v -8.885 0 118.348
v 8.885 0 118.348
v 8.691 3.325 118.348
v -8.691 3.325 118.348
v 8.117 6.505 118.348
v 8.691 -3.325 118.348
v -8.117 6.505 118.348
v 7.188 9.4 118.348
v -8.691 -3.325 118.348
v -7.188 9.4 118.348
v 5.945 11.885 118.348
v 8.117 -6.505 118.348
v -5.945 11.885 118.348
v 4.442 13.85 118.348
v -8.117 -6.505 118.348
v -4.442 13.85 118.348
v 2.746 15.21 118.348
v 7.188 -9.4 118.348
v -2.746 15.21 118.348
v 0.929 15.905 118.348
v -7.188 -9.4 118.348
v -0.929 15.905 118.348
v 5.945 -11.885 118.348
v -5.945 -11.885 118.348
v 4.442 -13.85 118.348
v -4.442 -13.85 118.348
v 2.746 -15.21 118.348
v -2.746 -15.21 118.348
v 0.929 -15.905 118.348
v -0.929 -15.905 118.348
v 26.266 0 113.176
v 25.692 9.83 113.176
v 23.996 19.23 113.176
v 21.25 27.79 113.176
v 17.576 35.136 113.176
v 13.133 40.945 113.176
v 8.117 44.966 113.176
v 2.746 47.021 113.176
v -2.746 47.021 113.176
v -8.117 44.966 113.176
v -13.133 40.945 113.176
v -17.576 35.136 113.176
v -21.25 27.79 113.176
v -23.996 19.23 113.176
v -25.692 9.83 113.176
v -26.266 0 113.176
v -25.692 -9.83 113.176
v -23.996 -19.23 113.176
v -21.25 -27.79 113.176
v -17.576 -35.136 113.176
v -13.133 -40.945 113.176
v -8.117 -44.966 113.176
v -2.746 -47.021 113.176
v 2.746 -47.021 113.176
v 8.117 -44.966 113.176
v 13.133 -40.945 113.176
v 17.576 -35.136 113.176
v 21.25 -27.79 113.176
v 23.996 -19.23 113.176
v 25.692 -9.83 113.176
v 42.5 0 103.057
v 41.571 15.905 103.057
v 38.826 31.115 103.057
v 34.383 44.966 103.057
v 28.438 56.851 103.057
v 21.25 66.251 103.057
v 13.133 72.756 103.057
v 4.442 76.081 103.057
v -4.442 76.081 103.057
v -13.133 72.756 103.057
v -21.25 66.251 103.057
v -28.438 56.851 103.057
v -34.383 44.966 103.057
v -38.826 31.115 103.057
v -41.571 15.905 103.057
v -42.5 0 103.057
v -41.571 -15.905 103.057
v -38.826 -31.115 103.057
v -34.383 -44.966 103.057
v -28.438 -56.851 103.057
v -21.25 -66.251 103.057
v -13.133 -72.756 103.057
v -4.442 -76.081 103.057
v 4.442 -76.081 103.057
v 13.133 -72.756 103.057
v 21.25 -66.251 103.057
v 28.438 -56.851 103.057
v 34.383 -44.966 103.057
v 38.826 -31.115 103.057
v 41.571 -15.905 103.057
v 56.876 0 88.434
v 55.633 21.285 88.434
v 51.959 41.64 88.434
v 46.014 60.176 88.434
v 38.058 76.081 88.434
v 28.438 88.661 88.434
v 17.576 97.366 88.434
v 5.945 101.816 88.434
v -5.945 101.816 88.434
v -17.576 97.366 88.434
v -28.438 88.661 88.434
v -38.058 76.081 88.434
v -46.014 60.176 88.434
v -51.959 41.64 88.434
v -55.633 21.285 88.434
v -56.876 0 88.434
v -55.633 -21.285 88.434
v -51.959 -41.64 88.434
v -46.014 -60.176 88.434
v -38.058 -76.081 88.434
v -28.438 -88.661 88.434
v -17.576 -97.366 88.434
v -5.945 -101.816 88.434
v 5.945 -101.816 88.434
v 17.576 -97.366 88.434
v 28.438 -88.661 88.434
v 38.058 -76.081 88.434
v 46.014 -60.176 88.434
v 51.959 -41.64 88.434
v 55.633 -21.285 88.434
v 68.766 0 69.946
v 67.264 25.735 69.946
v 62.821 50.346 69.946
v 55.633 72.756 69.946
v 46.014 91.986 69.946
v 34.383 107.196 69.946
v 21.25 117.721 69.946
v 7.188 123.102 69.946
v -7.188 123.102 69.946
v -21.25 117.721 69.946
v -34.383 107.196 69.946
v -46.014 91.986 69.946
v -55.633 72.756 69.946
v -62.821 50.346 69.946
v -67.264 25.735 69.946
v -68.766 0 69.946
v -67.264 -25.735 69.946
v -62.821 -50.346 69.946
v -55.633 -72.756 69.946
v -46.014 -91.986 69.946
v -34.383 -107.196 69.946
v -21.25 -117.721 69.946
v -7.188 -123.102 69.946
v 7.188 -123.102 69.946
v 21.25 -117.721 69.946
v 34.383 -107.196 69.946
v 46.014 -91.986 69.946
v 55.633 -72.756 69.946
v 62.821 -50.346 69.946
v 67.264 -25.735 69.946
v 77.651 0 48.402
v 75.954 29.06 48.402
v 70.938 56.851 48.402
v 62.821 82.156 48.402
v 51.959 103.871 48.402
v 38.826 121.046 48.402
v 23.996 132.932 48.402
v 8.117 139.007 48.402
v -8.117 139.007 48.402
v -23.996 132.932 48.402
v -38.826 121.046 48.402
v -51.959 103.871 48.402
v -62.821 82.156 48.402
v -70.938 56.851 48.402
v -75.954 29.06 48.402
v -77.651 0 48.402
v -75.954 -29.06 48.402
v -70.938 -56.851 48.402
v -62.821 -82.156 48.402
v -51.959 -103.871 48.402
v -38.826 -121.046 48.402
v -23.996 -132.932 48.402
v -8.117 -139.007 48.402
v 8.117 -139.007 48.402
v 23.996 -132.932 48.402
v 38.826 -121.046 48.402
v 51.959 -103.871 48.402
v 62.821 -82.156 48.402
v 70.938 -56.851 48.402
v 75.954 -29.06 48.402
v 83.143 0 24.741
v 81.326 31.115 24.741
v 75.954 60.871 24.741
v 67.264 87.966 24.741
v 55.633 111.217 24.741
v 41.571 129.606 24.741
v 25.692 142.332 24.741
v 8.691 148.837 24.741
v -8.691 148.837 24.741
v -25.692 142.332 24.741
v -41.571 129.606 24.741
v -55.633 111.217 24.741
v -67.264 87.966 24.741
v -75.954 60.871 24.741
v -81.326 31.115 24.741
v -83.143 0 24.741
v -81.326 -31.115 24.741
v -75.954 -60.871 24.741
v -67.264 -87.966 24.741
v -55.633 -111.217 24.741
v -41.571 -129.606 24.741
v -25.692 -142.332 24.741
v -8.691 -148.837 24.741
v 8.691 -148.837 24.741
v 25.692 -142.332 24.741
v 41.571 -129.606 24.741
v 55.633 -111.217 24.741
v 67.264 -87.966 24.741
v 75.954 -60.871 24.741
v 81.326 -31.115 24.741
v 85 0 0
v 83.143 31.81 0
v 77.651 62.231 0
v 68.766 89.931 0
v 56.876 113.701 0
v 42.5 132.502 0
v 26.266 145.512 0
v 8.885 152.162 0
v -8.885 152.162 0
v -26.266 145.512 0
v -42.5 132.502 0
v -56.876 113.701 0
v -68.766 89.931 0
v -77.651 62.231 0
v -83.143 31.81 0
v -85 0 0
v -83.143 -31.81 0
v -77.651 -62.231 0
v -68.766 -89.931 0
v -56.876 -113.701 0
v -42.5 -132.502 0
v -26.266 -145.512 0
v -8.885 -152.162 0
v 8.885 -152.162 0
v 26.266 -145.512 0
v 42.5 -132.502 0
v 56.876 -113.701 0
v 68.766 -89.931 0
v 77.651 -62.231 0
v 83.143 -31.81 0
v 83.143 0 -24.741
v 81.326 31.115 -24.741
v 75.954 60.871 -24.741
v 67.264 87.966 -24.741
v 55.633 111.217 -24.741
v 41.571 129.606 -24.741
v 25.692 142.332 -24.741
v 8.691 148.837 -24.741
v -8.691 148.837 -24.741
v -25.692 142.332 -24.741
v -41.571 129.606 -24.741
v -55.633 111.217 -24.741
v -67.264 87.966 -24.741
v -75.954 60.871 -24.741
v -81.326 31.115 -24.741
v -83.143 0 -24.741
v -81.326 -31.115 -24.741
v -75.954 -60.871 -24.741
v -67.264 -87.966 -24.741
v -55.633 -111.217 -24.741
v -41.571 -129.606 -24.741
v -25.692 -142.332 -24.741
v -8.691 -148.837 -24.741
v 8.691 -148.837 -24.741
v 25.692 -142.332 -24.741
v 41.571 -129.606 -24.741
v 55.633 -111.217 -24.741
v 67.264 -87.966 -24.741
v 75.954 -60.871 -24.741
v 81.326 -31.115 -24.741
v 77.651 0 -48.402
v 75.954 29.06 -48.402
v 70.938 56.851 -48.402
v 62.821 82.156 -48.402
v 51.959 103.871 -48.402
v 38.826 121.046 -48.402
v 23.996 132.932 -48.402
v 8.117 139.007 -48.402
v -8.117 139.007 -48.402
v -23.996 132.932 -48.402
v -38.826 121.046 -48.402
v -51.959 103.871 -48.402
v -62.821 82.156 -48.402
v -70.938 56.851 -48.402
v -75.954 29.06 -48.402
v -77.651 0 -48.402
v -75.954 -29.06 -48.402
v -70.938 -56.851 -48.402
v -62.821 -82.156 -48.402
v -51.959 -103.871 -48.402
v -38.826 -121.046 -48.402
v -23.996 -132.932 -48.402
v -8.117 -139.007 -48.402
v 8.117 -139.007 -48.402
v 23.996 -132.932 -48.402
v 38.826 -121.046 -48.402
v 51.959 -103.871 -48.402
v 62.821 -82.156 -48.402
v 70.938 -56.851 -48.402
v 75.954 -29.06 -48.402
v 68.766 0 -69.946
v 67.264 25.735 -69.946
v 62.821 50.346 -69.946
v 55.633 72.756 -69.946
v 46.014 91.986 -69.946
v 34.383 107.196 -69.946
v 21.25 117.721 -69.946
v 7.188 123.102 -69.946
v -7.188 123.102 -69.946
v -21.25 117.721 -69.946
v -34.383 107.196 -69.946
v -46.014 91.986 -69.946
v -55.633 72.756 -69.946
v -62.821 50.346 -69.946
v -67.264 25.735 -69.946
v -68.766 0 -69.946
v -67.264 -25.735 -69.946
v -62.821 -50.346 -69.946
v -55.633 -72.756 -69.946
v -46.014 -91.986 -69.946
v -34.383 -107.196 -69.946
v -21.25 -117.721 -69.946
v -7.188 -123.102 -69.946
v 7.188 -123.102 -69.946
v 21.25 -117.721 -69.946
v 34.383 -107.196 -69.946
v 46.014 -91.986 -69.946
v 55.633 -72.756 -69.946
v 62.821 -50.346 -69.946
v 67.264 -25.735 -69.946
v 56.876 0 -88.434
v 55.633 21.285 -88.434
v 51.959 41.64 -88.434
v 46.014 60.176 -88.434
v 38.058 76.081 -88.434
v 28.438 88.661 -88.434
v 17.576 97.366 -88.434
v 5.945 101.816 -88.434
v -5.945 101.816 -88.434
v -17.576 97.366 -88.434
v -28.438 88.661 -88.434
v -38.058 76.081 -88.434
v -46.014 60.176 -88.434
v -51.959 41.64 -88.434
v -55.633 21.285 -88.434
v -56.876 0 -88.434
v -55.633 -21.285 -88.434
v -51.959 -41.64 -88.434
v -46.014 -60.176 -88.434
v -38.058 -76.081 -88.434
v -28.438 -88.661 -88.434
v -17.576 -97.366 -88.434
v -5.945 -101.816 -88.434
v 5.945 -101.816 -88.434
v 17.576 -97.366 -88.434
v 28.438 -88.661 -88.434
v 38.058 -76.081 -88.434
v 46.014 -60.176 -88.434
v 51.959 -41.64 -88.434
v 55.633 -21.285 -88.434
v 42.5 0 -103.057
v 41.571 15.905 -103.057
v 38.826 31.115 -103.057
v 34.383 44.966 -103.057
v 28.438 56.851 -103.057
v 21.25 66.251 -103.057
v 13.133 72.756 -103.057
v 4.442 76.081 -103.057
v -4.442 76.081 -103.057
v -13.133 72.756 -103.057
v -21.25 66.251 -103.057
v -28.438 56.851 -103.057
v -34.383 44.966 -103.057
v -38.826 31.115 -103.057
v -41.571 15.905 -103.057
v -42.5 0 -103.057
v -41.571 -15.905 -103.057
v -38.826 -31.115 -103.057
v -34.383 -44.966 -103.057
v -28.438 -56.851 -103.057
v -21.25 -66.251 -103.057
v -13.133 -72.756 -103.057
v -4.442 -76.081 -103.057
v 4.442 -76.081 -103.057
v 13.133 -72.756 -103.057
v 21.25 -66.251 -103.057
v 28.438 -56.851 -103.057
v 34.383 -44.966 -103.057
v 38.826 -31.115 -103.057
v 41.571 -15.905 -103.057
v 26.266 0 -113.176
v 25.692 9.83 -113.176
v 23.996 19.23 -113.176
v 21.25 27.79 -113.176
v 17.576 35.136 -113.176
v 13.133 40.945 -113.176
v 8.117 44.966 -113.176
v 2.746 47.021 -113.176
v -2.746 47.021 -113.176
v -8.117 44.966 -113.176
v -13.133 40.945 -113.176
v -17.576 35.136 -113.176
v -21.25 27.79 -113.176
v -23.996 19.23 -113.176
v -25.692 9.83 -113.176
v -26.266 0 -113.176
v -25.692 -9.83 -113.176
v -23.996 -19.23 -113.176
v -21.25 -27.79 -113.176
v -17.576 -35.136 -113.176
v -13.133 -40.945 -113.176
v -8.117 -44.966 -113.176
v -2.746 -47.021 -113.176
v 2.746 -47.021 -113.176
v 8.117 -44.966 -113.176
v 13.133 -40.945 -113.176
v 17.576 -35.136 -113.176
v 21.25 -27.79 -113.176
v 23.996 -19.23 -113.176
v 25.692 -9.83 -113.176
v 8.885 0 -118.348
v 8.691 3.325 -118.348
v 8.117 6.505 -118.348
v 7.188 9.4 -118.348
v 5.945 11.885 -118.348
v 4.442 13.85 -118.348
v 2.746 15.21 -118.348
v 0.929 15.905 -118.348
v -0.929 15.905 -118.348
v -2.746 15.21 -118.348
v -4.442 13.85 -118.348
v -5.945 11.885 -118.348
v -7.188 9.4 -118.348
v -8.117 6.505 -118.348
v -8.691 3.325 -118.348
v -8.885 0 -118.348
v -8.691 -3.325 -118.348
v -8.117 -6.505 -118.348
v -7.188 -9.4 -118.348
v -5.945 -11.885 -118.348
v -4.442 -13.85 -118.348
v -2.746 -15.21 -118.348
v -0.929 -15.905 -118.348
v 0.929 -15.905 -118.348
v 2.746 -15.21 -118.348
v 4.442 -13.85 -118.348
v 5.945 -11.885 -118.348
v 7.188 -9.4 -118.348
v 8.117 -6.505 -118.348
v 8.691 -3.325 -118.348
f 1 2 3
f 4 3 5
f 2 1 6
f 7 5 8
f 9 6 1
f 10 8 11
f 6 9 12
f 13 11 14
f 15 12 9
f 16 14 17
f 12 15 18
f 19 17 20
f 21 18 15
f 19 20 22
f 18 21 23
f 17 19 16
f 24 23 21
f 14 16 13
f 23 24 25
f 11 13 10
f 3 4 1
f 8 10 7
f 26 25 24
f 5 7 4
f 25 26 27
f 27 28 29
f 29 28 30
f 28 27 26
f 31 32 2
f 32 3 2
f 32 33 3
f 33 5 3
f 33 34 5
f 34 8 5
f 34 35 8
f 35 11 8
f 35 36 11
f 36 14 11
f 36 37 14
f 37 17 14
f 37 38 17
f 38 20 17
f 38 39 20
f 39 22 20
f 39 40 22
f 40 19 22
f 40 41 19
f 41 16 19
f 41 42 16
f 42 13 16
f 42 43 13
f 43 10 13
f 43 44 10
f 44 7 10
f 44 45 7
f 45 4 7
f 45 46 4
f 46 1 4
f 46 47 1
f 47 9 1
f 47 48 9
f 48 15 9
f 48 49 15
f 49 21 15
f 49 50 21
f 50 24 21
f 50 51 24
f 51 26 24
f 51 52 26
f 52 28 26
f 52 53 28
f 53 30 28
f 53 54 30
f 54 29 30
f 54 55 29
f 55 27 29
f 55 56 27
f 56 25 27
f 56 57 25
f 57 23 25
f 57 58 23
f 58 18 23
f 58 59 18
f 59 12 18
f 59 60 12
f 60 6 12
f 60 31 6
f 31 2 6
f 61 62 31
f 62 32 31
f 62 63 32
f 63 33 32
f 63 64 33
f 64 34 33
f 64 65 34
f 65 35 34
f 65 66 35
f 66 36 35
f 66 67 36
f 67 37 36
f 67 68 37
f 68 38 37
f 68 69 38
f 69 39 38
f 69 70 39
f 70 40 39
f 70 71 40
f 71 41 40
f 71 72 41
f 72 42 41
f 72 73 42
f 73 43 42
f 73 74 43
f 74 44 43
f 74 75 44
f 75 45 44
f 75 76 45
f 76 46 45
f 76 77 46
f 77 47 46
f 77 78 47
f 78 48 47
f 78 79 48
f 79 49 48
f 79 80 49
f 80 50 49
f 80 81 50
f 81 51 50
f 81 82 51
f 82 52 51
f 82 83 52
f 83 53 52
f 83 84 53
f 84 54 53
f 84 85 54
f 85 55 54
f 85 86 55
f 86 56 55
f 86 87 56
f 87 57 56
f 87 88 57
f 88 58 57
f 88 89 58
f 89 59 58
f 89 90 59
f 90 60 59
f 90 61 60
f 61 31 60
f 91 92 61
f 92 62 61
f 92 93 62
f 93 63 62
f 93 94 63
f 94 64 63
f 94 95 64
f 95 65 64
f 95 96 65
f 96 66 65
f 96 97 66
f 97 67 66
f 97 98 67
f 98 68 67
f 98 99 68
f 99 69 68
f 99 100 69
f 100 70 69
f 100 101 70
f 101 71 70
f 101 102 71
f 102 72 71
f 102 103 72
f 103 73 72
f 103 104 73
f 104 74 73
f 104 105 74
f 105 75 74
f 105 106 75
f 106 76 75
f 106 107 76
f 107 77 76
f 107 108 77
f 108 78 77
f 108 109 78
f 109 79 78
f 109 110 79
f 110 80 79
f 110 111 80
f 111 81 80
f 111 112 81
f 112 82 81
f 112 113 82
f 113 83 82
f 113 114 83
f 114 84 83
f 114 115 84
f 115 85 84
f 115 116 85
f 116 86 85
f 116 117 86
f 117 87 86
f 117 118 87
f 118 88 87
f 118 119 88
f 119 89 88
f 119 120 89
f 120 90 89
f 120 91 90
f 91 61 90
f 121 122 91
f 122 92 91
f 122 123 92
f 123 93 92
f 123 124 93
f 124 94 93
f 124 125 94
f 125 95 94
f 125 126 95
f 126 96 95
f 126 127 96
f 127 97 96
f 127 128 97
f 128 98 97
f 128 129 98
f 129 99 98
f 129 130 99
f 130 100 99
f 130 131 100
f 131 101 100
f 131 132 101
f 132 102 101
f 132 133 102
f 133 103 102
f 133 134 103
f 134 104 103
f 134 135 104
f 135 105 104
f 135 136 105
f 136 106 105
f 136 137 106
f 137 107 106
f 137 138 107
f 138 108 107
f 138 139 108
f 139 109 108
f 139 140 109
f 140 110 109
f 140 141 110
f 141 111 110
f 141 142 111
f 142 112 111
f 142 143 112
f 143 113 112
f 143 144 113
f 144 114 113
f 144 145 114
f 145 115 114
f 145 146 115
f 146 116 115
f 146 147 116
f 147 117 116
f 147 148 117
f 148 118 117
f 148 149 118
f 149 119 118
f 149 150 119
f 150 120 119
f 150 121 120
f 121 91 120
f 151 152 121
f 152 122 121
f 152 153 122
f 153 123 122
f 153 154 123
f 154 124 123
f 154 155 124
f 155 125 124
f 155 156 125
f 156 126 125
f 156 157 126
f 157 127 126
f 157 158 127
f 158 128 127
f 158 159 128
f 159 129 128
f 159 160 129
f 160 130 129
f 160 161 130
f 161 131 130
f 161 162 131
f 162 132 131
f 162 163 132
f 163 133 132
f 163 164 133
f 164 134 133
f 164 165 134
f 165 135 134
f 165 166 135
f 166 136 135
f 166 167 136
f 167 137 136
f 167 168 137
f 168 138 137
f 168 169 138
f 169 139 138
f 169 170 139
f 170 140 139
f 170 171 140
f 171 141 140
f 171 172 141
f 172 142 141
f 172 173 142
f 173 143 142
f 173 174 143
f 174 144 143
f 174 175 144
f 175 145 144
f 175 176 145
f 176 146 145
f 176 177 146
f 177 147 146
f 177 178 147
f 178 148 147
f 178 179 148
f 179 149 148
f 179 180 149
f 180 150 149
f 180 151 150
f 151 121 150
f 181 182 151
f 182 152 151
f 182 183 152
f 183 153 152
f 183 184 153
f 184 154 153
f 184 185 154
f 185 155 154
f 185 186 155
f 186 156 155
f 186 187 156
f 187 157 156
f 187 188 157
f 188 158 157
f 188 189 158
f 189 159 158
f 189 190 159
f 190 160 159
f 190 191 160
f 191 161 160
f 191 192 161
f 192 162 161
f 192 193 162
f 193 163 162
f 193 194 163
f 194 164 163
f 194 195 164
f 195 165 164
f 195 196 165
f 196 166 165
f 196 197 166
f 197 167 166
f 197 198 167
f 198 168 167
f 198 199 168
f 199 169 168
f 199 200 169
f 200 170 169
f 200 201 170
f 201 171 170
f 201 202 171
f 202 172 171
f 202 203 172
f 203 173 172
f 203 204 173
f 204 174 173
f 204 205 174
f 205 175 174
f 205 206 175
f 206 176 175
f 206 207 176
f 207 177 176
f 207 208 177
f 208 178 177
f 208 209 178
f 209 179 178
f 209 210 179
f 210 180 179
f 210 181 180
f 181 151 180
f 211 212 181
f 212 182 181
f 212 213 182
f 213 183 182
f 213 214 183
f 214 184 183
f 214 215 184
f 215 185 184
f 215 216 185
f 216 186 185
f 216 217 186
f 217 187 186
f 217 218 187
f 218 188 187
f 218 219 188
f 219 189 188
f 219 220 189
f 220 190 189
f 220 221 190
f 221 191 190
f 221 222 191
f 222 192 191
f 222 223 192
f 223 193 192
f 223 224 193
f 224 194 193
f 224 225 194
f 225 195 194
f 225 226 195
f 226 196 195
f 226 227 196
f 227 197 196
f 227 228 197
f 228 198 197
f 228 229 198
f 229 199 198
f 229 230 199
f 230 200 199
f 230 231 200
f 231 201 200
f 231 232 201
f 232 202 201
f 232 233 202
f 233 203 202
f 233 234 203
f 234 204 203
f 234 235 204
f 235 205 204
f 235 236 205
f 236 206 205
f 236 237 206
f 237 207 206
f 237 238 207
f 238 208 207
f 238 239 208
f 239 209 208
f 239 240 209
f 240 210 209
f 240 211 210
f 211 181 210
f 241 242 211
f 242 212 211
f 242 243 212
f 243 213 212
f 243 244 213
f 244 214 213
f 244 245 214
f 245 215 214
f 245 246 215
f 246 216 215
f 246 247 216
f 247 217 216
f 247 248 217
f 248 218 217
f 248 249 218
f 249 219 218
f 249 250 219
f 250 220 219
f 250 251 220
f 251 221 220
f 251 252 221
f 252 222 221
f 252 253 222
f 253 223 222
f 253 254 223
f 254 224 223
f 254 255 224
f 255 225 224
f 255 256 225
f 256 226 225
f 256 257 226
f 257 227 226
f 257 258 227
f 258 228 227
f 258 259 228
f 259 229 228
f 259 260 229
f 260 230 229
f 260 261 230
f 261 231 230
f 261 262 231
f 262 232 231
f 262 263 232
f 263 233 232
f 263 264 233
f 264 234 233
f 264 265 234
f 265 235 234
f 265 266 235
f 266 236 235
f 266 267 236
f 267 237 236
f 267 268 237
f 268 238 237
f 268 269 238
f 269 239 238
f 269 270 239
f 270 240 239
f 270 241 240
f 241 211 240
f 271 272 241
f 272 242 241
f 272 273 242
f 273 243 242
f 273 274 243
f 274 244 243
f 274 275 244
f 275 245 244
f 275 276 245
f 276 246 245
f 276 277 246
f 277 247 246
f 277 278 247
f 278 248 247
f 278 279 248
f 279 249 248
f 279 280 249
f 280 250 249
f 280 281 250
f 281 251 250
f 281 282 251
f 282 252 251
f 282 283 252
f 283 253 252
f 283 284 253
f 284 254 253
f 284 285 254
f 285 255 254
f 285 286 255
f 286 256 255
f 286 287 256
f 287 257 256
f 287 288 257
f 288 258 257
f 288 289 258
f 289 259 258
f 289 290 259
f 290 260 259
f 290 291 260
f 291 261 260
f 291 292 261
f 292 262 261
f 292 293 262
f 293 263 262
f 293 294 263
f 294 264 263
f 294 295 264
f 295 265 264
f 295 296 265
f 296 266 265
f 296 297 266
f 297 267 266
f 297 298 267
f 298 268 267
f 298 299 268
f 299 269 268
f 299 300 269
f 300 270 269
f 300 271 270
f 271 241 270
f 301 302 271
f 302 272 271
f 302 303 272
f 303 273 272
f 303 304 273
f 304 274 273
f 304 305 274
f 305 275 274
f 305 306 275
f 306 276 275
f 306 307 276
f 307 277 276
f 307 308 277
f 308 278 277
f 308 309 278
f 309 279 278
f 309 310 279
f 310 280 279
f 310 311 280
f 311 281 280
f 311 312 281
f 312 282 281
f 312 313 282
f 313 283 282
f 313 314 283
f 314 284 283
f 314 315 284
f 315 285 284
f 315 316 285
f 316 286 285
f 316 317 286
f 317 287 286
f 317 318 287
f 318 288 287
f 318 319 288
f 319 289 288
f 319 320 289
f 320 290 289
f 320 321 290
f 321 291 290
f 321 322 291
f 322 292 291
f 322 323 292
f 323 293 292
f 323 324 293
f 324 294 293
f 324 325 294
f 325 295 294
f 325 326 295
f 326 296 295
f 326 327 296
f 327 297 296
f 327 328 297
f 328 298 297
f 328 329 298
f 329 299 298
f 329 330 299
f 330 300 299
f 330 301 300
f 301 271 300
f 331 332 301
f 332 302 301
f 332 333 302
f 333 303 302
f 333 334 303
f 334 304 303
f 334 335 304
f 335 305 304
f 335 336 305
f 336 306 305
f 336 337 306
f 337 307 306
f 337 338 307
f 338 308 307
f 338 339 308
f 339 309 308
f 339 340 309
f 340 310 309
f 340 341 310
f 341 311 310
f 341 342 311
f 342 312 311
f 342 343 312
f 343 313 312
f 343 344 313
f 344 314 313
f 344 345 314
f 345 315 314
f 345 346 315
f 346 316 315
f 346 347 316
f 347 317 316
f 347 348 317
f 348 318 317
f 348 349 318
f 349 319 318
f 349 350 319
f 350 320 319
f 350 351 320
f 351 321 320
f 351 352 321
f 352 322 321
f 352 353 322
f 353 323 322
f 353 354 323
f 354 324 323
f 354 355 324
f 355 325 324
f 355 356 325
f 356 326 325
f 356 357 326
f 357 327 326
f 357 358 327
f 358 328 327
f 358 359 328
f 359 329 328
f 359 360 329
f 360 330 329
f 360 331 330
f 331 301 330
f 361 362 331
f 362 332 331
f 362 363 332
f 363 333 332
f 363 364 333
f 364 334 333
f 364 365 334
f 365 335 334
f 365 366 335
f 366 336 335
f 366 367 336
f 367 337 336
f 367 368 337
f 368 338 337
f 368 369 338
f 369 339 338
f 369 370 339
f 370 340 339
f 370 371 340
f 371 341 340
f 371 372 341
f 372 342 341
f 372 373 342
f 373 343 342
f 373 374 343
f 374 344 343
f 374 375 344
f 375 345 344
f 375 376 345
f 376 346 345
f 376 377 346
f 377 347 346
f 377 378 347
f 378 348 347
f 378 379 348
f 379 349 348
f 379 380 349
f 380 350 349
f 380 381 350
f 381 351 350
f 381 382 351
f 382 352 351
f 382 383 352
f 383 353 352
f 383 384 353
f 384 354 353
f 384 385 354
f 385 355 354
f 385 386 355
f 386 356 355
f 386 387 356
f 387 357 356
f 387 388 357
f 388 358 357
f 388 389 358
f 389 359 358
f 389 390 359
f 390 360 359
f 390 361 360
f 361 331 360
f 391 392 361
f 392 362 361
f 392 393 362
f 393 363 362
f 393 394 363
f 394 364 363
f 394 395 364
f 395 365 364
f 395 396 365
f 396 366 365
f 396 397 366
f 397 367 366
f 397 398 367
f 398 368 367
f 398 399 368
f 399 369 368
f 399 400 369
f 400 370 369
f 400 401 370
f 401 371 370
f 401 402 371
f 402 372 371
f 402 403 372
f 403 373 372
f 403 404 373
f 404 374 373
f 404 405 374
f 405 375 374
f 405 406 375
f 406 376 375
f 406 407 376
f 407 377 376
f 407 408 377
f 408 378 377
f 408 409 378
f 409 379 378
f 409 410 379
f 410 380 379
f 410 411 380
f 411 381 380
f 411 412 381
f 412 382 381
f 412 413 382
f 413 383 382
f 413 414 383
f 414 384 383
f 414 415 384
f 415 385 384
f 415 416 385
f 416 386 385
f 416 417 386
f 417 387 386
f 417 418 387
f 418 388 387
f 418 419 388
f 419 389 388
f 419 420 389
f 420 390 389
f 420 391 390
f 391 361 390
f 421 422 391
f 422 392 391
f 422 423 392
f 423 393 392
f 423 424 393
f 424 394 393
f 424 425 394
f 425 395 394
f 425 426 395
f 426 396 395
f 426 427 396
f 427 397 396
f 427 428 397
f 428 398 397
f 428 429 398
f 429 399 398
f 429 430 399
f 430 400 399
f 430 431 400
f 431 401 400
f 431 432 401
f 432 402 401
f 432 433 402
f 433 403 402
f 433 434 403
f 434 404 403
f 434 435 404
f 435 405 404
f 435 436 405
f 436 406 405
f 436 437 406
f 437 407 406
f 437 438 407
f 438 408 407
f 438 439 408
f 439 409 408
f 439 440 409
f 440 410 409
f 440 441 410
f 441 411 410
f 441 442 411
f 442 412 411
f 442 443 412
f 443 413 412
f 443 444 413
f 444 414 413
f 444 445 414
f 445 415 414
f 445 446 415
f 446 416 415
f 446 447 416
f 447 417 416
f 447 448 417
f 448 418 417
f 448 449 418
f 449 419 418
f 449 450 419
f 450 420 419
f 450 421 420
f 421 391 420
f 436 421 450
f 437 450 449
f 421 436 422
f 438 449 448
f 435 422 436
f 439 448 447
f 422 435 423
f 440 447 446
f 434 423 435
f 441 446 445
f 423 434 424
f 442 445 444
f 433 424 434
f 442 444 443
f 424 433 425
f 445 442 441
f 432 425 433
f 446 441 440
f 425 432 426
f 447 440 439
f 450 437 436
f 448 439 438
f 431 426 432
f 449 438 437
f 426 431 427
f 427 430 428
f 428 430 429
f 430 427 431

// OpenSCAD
// Generated by SolidPython 1.0.1 on 2020-07-29 00:46:46


scale(v = [5, 9, 7]) {
	sphere(r = 17);
}
/***********************************************
*********      SolidPython code:      **********
************************************************
 
# import packages: SolidPython
from solid import *
from solid.utils import *
from itertools import chain, combinations, permutations


class Resize:

    def __init__(self, scad_file):
        self.scad_file = scad_file
        #self.scad_file = import_scad(scad_file)
        # cone/cylinder param:
        self.r1 = 0
        self.r2 = 0
        self.h = 0
        # rectangular prism param:
        self.w = 0
        self.l = 0
        # ellipse param:
        self.r = 0

    # import OpenScad code (file name corresponds to shape)


    # classify shape + parameters
    def assign(self, param1, param2, param3):
        if self.scad_file == 'cone.scad':
            self.r1 = param1
            self.r2 = param2
            self.h = param3
        elif self.scad_file == 'cylinder.scad':
            self.r1 = param1
            self.r2 = param2
            self.h = param3
        elif self.scad_file == 'rectangularPrism.scad':
            self.h = param1
            self.l = param2
            self.w = param3
        else:
            self.r = param1
            self.h = param2

    # resize parameters
    def iterate(self):
        x = range(3, 20, 2)
        i = 1
        if self.scad_file == 'cone.scad':
            tempList = list(permutations(x, 2))
            for temp in tempList:
                param1 = temp[0]
                param2 = temp[1]
                filepath = 'produced_scad_files/' + 'cone' + str(param1) + '_' + str(param2) + '_' + '.scad'
                scad_render_to_file(cylinder(h=param1, r1=param2, r2=0), filepath)

        elif self.scad_file == 'cylinder.scad':
            tempList = list(permutations(x, 3))
            for temp in tempList:
                param1 = temp[0]
                param2 = temp[1]
                filepath = 'produced_scad_files/' + 'cylinder' + str(param1) + '_' + str(param2) + '_' + '.scad'
                scad_render_to_file(cylinder(h=param1, r1=param2, r2=param2), filepath)

        elif self.scad_file == 'rectangularPrism.scad':
            tempList = list(permutations(x, 3))
            for temp in tempList:
                param1 = temp[0]
                param2 = temp[1]
                param3 = temp[2]
                filepath = 'produced_scad_files/' + 'rectangularPrism' + str(param1) + '_' + str(param2) + '_' + str(
                    param3) + '.scad'
                scad_render_to_file(cube(size=(param1, param2, param3)), filepath)

        elif self.scad_file == 'ellipse.scad':
            tempList = list(permutations(x, 4))
            for temp in tempList:
                param1 = temp[0]
                param2 = temp[1]
                param3 = temp[2]
                param4 = temp[3]
                filepath = 'produced_scad_files/' + 'ellipse' + str(param1) + '_' + str(param2) + '_' + str(param3) + '_' + str(param4) + '.scad'
                scad_render_to_file(scale([param1, param2, param3])(sphere(r=param4)), filepath)

    def render_to_scadfile(self):
        scad_render_to_file(scad, 'example.scad') 
 
************************************************/
